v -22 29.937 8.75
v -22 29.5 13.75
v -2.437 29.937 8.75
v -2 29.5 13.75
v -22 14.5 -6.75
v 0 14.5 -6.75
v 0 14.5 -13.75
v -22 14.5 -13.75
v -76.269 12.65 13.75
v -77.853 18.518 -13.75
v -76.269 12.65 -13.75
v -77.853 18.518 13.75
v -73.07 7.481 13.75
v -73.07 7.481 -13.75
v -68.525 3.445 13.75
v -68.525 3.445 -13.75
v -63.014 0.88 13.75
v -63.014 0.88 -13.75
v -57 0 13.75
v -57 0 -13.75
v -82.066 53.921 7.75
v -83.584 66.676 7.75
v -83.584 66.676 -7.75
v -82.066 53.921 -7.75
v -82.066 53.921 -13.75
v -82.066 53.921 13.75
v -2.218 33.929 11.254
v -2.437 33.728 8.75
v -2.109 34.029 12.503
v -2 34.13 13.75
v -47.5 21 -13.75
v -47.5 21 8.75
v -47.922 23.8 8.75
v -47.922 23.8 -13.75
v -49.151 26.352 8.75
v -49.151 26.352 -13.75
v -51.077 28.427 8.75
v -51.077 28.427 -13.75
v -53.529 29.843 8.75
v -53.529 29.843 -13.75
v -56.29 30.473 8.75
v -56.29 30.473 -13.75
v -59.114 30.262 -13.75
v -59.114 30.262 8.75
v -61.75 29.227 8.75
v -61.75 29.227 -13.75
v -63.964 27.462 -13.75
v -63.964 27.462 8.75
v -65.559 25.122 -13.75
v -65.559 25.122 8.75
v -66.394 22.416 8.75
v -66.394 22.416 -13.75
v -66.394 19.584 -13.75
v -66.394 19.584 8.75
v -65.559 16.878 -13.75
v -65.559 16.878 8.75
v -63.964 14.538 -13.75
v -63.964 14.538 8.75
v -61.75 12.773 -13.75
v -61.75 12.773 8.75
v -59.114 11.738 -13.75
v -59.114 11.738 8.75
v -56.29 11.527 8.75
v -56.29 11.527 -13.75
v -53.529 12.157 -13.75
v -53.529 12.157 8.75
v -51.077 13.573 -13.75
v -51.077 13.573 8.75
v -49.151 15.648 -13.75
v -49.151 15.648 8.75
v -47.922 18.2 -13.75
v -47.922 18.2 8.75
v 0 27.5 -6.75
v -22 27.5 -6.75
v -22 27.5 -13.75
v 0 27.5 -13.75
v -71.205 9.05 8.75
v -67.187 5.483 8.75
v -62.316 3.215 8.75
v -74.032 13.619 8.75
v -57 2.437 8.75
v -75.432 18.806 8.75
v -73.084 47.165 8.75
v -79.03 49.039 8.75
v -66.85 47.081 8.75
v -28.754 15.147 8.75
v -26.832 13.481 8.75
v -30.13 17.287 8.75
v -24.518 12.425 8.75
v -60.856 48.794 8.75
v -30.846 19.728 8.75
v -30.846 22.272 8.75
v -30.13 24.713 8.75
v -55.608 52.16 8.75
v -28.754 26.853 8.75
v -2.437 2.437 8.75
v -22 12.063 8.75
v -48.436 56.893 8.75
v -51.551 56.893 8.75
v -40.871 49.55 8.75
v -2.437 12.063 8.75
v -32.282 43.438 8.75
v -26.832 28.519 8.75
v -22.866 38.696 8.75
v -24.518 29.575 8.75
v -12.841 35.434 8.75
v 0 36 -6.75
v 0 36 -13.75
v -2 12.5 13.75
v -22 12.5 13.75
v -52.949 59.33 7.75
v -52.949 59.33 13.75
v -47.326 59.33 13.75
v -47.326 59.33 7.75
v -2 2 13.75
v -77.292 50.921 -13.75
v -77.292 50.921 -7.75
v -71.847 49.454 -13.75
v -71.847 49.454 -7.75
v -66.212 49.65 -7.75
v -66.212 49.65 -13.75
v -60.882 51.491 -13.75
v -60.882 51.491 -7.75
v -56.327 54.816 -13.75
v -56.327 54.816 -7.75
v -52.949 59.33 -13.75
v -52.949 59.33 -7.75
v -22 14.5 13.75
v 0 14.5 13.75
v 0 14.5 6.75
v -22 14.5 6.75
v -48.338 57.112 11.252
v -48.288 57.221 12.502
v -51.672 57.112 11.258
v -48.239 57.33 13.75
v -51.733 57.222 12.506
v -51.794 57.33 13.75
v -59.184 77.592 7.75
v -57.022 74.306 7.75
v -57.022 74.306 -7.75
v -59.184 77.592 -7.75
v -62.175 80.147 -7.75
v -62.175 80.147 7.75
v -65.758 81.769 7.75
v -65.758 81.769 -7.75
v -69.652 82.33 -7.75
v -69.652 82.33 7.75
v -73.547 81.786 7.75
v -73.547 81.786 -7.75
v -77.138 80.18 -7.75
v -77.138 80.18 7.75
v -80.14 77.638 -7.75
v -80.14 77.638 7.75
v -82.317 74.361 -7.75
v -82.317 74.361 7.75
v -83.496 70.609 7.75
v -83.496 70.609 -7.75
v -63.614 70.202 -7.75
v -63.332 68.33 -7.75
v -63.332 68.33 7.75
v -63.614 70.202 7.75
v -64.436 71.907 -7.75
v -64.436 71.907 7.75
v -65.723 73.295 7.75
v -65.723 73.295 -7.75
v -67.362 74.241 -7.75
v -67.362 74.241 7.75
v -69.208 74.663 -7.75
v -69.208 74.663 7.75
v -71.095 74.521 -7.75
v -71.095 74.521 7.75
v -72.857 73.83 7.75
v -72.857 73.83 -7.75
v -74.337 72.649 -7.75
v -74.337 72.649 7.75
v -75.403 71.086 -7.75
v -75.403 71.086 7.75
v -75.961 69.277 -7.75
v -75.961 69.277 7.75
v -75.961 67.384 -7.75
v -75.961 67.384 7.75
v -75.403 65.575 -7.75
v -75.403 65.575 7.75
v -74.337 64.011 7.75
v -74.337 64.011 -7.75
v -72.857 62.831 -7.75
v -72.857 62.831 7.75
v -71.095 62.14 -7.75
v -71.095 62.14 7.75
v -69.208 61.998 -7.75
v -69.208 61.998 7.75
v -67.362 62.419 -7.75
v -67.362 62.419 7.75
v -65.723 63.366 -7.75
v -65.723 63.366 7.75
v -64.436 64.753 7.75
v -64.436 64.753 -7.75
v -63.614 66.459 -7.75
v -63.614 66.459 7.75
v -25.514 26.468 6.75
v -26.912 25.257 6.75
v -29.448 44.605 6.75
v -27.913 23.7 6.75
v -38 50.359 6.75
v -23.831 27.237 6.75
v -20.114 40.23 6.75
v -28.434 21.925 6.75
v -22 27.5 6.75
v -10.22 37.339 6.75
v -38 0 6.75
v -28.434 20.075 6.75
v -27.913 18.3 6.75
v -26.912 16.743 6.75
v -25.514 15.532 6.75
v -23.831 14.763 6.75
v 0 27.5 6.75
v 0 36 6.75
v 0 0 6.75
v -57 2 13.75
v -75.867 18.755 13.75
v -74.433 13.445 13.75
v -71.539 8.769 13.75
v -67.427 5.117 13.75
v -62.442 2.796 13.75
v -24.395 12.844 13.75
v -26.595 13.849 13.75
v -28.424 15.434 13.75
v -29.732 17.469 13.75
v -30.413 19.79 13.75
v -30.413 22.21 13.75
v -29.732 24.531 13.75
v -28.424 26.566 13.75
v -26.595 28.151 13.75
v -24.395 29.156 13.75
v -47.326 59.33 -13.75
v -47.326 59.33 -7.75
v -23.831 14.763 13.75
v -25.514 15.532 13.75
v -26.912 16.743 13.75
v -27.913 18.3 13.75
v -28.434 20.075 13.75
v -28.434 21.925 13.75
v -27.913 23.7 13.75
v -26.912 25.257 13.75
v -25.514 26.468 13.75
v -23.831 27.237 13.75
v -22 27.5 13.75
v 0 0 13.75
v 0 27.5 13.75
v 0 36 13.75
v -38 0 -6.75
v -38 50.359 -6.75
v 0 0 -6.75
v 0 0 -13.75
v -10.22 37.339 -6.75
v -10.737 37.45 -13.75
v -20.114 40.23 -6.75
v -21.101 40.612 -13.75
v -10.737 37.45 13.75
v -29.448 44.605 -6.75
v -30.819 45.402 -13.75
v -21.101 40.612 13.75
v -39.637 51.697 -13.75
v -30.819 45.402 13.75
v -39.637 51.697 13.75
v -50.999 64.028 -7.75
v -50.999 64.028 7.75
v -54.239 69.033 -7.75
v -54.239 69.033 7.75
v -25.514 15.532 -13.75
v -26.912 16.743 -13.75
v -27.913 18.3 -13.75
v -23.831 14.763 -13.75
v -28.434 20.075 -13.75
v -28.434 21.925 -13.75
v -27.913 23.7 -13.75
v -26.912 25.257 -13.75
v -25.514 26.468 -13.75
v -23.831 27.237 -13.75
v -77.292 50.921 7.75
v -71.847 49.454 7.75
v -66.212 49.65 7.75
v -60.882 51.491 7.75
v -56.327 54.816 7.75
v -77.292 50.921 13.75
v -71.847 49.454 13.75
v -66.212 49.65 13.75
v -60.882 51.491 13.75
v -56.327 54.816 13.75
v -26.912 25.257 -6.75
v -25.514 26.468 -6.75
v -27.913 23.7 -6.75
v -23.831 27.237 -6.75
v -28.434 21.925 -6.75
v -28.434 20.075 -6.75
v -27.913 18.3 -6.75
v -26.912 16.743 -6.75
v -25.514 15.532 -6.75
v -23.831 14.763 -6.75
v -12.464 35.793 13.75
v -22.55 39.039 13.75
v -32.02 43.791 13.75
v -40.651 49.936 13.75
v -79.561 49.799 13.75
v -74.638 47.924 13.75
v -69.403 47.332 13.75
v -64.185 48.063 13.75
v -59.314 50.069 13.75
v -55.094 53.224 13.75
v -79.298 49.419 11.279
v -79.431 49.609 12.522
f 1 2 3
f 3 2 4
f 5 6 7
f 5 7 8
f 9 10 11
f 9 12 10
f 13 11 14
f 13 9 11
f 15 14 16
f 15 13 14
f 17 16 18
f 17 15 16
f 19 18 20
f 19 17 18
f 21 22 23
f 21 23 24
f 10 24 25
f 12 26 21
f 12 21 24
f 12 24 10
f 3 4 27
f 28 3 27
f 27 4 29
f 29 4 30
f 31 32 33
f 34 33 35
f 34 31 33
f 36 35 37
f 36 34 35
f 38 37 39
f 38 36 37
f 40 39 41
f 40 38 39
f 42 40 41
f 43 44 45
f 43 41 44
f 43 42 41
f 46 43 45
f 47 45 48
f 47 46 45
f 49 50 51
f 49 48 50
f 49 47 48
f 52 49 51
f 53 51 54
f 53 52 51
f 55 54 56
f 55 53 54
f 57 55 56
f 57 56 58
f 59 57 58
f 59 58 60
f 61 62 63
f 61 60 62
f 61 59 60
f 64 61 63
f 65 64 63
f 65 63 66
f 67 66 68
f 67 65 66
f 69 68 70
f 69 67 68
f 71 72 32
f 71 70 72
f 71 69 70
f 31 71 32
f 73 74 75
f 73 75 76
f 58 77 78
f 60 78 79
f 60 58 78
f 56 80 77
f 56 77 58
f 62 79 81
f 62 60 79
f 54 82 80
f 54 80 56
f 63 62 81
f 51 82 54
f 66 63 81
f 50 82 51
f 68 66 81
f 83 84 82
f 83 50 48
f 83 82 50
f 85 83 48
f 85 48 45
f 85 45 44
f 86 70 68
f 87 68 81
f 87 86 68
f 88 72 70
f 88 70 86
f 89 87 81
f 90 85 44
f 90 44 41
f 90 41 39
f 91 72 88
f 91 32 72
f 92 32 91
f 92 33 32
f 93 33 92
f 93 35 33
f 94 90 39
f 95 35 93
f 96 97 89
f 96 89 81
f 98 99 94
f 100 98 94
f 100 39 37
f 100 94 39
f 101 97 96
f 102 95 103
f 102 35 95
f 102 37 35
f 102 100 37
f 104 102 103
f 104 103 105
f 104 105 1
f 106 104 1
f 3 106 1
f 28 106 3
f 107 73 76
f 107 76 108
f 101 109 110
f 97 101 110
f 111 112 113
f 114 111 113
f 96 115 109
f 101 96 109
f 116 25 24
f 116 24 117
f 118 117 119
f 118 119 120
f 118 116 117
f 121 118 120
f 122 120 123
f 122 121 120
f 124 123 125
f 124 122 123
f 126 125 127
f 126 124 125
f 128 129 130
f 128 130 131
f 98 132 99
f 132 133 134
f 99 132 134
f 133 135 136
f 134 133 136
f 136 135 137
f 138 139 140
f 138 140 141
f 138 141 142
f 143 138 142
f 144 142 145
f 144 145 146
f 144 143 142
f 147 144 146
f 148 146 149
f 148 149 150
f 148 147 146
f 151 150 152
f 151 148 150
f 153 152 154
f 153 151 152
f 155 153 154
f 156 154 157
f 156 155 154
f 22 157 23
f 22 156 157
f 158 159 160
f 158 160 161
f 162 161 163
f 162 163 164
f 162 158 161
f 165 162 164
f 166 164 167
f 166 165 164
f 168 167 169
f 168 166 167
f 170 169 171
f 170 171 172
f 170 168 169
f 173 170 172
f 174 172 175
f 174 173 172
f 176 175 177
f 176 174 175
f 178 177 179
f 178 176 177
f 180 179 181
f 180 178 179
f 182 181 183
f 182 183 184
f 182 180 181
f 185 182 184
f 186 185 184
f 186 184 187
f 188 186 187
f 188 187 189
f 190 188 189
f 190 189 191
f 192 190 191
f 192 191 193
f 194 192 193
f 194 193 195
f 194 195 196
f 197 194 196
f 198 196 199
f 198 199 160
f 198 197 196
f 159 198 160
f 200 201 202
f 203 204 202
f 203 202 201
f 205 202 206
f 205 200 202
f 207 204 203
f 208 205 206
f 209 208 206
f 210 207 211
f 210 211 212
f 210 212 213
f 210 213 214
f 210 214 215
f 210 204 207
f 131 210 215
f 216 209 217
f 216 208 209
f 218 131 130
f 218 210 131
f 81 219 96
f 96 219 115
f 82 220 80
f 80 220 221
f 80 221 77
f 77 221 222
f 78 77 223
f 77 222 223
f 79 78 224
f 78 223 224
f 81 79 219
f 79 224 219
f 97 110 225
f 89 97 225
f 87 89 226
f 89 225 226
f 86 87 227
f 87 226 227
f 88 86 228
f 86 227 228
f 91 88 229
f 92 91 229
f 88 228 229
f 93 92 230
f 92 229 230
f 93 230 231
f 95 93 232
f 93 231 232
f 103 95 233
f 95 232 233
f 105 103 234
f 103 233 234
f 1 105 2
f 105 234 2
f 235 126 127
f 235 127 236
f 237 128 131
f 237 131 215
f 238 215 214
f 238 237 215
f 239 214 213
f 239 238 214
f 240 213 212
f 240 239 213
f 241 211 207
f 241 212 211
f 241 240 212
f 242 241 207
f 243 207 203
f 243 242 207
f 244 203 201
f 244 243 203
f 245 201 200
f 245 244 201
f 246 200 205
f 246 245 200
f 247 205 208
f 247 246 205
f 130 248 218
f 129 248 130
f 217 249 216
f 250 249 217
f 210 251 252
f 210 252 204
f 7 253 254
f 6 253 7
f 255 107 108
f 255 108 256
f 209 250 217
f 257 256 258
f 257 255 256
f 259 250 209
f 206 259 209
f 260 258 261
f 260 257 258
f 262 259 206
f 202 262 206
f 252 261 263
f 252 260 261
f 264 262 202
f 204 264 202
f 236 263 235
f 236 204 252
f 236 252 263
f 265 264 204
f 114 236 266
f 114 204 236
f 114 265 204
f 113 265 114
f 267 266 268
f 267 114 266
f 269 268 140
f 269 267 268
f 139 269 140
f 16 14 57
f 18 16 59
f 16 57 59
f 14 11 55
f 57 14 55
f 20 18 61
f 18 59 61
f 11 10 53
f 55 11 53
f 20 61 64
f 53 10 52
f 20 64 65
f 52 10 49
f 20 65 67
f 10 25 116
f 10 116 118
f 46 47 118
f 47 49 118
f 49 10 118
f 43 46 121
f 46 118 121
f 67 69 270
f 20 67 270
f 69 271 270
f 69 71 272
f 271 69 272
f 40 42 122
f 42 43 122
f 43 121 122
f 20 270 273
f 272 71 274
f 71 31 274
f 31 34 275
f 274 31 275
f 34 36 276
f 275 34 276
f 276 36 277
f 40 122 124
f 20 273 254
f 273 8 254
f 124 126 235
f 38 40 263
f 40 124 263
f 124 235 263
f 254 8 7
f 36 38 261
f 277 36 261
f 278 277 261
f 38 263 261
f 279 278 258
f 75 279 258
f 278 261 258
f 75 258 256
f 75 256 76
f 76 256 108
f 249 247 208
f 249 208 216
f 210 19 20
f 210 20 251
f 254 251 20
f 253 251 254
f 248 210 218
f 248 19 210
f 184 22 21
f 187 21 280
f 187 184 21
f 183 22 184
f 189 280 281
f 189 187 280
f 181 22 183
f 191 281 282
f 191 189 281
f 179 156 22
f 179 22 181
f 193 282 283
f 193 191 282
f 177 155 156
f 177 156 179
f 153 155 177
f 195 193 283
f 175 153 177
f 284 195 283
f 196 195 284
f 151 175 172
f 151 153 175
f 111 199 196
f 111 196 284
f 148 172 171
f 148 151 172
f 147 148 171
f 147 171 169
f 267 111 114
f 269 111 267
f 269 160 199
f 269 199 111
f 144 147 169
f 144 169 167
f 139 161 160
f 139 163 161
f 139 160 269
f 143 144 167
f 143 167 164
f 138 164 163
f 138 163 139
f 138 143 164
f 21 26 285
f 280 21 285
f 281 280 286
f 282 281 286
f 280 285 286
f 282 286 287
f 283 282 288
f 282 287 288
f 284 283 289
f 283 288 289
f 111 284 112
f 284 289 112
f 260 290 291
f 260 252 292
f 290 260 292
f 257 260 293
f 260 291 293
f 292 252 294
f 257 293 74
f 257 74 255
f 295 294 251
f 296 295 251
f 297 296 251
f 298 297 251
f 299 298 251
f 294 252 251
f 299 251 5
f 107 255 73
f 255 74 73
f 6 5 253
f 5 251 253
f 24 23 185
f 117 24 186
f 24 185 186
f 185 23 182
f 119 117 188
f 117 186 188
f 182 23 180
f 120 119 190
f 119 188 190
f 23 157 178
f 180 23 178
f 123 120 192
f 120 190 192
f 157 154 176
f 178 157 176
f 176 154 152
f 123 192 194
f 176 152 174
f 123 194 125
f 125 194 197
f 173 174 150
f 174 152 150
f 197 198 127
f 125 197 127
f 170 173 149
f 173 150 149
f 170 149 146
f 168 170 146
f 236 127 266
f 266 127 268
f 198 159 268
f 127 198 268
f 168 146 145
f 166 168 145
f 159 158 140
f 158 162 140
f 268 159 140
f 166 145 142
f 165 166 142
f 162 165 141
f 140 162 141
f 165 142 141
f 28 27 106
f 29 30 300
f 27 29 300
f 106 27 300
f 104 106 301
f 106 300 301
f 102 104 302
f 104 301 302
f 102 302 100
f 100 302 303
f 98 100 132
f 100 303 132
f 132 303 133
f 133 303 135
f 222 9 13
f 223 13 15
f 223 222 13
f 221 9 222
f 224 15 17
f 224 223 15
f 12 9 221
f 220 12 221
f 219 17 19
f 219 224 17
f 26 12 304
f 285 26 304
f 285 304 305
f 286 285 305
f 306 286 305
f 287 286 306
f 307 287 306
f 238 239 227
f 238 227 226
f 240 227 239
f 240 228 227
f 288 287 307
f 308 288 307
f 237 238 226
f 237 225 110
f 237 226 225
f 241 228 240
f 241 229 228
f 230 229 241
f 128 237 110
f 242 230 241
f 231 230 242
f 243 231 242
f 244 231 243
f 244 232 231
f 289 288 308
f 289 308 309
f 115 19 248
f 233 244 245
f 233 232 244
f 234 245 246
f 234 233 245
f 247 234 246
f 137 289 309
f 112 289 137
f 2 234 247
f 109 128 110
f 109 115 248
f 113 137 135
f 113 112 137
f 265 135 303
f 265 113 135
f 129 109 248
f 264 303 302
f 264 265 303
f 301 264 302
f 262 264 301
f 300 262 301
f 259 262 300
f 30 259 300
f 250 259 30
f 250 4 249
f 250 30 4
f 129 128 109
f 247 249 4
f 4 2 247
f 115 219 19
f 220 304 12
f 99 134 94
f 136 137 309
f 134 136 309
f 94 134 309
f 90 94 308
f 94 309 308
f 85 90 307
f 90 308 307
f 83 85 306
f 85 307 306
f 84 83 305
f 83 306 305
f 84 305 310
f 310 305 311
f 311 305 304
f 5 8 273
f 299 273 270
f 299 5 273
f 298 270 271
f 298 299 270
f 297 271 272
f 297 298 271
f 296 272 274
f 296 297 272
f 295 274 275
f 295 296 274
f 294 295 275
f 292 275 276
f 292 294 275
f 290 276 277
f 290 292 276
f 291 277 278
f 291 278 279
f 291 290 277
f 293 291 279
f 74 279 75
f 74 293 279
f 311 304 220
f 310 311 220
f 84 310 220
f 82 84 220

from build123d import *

# Parameters (mm, degrees)
SKETCH1_R           = 6.35
SKETCH1_R_2         = 9.5
BOSS_EXTRUDE1_DEPTH = 13.75
SKETCH3_R           = 6.35
CUT_EXTRUDE1_DEPTH  = 6
SKETCH4_W           = 38
SKETCH4_H           = 13.5
CUT_EXTRUDE2_DEPTH  = 83.330365488
CUT_EXTRUDE3_DEPTH  = 5
CUT_EXTRUDE3_DRAFT  = -5


with BuildPart() as part:
    # Sketch1 → Boss-Extrude1 (new body, symmetric)
    with BuildSketch(Plane.XY):
        with BuildLine():
            Line((0, 0), (0, 14.5))
            Line((0, 14.5), (-22, 14.5))
            ThreePointArc((-22, 14.5), (-28.5, 21), (-22, 27.5))
            Line((-22, 27.5), (0, 27.5))
            Line((0, 27.5), (0, 36))
            ThreePointArc((0, 36), (-33.793604177, 47.289264213), (-57.021595035, 74.306214643))
            ThreePointArc((-57.021595035, 74.306214643), (-73.547441909, 81.786196516), (-83.58403216, 66.675915252))
            Line((-83.58403216, 66.675915252), (-77.852848425, 18.518324646))
            ThreePointArc((-77.852848425, 18.518324646), (-70.944260783, 5.297847561), (-57, 0))
            Line((-57, 0), (0, 0))
        make_face()
        with Locations((-69.68213321, 68.330365488)):
            Circle(SKETCH1_R, mode=Mode.SUBTRACT)
        with Locations((-57, 21)):
            Circle(SKETCH1_R_2, mode=Mode.SUBTRACT)
    extrude(amount=BOSS_EXTRUDE1_DEPTH, both=True)

    # Sketch3 → Cut-Extrude1 (cut)
    with BuildSketch(Plane.XY.offset(13.75)):
        with BuildLine():
            ThreePointArc((-57.021595035, 74.306214643), (-73.547441909, 81.786196516), (-83.58403216, 66.675915252))
            Line((-83.58403216, 66.675915252), (-82.066046583, 53.920692017))
            ThreePointArc((-82.066046583, 53.920692017), (-66.211511297, 49.650034026), (-52.948932679, 59.330365488))
            Line((-52.948932679, 59.330365488), (-47.326454774, 59.330365488))
            ThreePointArc((-47.326454774, 59.330365488), (-52.674708251, 66.494155172), (-57.021595035, 74.306214643))
        make_face()
        with Locations((-69.68213321, 68.330365488)):
            Circle(SKETCH3_R, mode=Mode.SUBTRACT)
    cut_extrude1 = extrude(amount=-CUT_EXTRUDE1_DEPTH, mode=Mode.SUBTRACT)

    # Mirror1: Cut-Extrude1 across plane
    add(cut_extrude1.mirror(Plane.XY), mode=Mode.SUBTRACT)

    # Sketch4 → Cut-Extrude2 (cut, through all)
    with BuildSketch(Plane.XZ):
        with Locations((-19, 0)):
            Rectangle(SKETCH4_W, SKETCH4_H)
    extrude(amount=-CUT_EXTRUDE2_DEPTH, mode=Mode.SUBTRACT)


with BuildPart() as cut_extrude3_tool:
    # Sketch5 → Cut-Extrude3 (with draft: the straight prism first)
    with BuildSketch(Plane.XY.offset(13.75)):
        with BuildLine():
            ThreePointArc((-51.79358939, 57.330365488), (-64.185224634, 48.062558599), (-79.561455233, 49.799337552))
            Line((-79.561455233, 49.799337552), (-75.866862861, 18.75467468))
            ThreePointArc((-75.866862861, 18.75467468), (-69.616235946, 6.79329065), (-57, 2))
            Line((-57, 2), (-2, 2))
            Line((-2, 2), (-2, 12.5))
            Line((-2, 12.5), (-22, 12.5))
            ThreePointArc((-22, 12.5), (-30.5, 21), (-22, 29.5))
            Line((-22, 29.5), (-2, 29.5))
            Line((-2, 29.5), (-2, 34.12995492))
            ThreePointArc((-2, 34.12995492), (-27.376011233, 41.232719036), (-48.238824631, 57.330365488))
            Line((-48.238824631, 57.330365488), (-51.79358939, 57.330365488))
        make_face()
    extrude(amount=-CUT_EXTRUDE3_DEPTH)
    # Cut-Extrude3: the draft: its side faces are tilted about the plane it starts from
    cut_extrude3_sides = [cut_extrude3_tool.faces().sort_by_distance(p)[0] for p in [
        (-50.01620701, 57.330365488, 11.25),
        (-64.185224634, 48.062558599, 11.25),
        (-77.714159047, 34.277006116, 11.25),
        (-69.616235946, 6.79329065, 11.25),
        (-29.5, 2, 11.25),
        (-2, 7.25, 11.25),
        (-12, 12.5, 11.25),
        (-30.5, 21, 11.25),
        (-12, 29.5, 11.25),
        (-2, 31.81497746, 11.25),
        (-27.376011233, 41.232719036, 11.25),
    ]]
    draft(cut_extrude3_sides, Plane.XY.offset(13.75), CUT_EXTRUDE3_DRAFT)


with BuildPart() as part_1:
    add(part.part)

    # Cut-Extrude3: cut by cut_extrude3_tool
    add(cut_extrude3_tool.part, mode=Mode.SUBTRACT)


solid = part_1.part
